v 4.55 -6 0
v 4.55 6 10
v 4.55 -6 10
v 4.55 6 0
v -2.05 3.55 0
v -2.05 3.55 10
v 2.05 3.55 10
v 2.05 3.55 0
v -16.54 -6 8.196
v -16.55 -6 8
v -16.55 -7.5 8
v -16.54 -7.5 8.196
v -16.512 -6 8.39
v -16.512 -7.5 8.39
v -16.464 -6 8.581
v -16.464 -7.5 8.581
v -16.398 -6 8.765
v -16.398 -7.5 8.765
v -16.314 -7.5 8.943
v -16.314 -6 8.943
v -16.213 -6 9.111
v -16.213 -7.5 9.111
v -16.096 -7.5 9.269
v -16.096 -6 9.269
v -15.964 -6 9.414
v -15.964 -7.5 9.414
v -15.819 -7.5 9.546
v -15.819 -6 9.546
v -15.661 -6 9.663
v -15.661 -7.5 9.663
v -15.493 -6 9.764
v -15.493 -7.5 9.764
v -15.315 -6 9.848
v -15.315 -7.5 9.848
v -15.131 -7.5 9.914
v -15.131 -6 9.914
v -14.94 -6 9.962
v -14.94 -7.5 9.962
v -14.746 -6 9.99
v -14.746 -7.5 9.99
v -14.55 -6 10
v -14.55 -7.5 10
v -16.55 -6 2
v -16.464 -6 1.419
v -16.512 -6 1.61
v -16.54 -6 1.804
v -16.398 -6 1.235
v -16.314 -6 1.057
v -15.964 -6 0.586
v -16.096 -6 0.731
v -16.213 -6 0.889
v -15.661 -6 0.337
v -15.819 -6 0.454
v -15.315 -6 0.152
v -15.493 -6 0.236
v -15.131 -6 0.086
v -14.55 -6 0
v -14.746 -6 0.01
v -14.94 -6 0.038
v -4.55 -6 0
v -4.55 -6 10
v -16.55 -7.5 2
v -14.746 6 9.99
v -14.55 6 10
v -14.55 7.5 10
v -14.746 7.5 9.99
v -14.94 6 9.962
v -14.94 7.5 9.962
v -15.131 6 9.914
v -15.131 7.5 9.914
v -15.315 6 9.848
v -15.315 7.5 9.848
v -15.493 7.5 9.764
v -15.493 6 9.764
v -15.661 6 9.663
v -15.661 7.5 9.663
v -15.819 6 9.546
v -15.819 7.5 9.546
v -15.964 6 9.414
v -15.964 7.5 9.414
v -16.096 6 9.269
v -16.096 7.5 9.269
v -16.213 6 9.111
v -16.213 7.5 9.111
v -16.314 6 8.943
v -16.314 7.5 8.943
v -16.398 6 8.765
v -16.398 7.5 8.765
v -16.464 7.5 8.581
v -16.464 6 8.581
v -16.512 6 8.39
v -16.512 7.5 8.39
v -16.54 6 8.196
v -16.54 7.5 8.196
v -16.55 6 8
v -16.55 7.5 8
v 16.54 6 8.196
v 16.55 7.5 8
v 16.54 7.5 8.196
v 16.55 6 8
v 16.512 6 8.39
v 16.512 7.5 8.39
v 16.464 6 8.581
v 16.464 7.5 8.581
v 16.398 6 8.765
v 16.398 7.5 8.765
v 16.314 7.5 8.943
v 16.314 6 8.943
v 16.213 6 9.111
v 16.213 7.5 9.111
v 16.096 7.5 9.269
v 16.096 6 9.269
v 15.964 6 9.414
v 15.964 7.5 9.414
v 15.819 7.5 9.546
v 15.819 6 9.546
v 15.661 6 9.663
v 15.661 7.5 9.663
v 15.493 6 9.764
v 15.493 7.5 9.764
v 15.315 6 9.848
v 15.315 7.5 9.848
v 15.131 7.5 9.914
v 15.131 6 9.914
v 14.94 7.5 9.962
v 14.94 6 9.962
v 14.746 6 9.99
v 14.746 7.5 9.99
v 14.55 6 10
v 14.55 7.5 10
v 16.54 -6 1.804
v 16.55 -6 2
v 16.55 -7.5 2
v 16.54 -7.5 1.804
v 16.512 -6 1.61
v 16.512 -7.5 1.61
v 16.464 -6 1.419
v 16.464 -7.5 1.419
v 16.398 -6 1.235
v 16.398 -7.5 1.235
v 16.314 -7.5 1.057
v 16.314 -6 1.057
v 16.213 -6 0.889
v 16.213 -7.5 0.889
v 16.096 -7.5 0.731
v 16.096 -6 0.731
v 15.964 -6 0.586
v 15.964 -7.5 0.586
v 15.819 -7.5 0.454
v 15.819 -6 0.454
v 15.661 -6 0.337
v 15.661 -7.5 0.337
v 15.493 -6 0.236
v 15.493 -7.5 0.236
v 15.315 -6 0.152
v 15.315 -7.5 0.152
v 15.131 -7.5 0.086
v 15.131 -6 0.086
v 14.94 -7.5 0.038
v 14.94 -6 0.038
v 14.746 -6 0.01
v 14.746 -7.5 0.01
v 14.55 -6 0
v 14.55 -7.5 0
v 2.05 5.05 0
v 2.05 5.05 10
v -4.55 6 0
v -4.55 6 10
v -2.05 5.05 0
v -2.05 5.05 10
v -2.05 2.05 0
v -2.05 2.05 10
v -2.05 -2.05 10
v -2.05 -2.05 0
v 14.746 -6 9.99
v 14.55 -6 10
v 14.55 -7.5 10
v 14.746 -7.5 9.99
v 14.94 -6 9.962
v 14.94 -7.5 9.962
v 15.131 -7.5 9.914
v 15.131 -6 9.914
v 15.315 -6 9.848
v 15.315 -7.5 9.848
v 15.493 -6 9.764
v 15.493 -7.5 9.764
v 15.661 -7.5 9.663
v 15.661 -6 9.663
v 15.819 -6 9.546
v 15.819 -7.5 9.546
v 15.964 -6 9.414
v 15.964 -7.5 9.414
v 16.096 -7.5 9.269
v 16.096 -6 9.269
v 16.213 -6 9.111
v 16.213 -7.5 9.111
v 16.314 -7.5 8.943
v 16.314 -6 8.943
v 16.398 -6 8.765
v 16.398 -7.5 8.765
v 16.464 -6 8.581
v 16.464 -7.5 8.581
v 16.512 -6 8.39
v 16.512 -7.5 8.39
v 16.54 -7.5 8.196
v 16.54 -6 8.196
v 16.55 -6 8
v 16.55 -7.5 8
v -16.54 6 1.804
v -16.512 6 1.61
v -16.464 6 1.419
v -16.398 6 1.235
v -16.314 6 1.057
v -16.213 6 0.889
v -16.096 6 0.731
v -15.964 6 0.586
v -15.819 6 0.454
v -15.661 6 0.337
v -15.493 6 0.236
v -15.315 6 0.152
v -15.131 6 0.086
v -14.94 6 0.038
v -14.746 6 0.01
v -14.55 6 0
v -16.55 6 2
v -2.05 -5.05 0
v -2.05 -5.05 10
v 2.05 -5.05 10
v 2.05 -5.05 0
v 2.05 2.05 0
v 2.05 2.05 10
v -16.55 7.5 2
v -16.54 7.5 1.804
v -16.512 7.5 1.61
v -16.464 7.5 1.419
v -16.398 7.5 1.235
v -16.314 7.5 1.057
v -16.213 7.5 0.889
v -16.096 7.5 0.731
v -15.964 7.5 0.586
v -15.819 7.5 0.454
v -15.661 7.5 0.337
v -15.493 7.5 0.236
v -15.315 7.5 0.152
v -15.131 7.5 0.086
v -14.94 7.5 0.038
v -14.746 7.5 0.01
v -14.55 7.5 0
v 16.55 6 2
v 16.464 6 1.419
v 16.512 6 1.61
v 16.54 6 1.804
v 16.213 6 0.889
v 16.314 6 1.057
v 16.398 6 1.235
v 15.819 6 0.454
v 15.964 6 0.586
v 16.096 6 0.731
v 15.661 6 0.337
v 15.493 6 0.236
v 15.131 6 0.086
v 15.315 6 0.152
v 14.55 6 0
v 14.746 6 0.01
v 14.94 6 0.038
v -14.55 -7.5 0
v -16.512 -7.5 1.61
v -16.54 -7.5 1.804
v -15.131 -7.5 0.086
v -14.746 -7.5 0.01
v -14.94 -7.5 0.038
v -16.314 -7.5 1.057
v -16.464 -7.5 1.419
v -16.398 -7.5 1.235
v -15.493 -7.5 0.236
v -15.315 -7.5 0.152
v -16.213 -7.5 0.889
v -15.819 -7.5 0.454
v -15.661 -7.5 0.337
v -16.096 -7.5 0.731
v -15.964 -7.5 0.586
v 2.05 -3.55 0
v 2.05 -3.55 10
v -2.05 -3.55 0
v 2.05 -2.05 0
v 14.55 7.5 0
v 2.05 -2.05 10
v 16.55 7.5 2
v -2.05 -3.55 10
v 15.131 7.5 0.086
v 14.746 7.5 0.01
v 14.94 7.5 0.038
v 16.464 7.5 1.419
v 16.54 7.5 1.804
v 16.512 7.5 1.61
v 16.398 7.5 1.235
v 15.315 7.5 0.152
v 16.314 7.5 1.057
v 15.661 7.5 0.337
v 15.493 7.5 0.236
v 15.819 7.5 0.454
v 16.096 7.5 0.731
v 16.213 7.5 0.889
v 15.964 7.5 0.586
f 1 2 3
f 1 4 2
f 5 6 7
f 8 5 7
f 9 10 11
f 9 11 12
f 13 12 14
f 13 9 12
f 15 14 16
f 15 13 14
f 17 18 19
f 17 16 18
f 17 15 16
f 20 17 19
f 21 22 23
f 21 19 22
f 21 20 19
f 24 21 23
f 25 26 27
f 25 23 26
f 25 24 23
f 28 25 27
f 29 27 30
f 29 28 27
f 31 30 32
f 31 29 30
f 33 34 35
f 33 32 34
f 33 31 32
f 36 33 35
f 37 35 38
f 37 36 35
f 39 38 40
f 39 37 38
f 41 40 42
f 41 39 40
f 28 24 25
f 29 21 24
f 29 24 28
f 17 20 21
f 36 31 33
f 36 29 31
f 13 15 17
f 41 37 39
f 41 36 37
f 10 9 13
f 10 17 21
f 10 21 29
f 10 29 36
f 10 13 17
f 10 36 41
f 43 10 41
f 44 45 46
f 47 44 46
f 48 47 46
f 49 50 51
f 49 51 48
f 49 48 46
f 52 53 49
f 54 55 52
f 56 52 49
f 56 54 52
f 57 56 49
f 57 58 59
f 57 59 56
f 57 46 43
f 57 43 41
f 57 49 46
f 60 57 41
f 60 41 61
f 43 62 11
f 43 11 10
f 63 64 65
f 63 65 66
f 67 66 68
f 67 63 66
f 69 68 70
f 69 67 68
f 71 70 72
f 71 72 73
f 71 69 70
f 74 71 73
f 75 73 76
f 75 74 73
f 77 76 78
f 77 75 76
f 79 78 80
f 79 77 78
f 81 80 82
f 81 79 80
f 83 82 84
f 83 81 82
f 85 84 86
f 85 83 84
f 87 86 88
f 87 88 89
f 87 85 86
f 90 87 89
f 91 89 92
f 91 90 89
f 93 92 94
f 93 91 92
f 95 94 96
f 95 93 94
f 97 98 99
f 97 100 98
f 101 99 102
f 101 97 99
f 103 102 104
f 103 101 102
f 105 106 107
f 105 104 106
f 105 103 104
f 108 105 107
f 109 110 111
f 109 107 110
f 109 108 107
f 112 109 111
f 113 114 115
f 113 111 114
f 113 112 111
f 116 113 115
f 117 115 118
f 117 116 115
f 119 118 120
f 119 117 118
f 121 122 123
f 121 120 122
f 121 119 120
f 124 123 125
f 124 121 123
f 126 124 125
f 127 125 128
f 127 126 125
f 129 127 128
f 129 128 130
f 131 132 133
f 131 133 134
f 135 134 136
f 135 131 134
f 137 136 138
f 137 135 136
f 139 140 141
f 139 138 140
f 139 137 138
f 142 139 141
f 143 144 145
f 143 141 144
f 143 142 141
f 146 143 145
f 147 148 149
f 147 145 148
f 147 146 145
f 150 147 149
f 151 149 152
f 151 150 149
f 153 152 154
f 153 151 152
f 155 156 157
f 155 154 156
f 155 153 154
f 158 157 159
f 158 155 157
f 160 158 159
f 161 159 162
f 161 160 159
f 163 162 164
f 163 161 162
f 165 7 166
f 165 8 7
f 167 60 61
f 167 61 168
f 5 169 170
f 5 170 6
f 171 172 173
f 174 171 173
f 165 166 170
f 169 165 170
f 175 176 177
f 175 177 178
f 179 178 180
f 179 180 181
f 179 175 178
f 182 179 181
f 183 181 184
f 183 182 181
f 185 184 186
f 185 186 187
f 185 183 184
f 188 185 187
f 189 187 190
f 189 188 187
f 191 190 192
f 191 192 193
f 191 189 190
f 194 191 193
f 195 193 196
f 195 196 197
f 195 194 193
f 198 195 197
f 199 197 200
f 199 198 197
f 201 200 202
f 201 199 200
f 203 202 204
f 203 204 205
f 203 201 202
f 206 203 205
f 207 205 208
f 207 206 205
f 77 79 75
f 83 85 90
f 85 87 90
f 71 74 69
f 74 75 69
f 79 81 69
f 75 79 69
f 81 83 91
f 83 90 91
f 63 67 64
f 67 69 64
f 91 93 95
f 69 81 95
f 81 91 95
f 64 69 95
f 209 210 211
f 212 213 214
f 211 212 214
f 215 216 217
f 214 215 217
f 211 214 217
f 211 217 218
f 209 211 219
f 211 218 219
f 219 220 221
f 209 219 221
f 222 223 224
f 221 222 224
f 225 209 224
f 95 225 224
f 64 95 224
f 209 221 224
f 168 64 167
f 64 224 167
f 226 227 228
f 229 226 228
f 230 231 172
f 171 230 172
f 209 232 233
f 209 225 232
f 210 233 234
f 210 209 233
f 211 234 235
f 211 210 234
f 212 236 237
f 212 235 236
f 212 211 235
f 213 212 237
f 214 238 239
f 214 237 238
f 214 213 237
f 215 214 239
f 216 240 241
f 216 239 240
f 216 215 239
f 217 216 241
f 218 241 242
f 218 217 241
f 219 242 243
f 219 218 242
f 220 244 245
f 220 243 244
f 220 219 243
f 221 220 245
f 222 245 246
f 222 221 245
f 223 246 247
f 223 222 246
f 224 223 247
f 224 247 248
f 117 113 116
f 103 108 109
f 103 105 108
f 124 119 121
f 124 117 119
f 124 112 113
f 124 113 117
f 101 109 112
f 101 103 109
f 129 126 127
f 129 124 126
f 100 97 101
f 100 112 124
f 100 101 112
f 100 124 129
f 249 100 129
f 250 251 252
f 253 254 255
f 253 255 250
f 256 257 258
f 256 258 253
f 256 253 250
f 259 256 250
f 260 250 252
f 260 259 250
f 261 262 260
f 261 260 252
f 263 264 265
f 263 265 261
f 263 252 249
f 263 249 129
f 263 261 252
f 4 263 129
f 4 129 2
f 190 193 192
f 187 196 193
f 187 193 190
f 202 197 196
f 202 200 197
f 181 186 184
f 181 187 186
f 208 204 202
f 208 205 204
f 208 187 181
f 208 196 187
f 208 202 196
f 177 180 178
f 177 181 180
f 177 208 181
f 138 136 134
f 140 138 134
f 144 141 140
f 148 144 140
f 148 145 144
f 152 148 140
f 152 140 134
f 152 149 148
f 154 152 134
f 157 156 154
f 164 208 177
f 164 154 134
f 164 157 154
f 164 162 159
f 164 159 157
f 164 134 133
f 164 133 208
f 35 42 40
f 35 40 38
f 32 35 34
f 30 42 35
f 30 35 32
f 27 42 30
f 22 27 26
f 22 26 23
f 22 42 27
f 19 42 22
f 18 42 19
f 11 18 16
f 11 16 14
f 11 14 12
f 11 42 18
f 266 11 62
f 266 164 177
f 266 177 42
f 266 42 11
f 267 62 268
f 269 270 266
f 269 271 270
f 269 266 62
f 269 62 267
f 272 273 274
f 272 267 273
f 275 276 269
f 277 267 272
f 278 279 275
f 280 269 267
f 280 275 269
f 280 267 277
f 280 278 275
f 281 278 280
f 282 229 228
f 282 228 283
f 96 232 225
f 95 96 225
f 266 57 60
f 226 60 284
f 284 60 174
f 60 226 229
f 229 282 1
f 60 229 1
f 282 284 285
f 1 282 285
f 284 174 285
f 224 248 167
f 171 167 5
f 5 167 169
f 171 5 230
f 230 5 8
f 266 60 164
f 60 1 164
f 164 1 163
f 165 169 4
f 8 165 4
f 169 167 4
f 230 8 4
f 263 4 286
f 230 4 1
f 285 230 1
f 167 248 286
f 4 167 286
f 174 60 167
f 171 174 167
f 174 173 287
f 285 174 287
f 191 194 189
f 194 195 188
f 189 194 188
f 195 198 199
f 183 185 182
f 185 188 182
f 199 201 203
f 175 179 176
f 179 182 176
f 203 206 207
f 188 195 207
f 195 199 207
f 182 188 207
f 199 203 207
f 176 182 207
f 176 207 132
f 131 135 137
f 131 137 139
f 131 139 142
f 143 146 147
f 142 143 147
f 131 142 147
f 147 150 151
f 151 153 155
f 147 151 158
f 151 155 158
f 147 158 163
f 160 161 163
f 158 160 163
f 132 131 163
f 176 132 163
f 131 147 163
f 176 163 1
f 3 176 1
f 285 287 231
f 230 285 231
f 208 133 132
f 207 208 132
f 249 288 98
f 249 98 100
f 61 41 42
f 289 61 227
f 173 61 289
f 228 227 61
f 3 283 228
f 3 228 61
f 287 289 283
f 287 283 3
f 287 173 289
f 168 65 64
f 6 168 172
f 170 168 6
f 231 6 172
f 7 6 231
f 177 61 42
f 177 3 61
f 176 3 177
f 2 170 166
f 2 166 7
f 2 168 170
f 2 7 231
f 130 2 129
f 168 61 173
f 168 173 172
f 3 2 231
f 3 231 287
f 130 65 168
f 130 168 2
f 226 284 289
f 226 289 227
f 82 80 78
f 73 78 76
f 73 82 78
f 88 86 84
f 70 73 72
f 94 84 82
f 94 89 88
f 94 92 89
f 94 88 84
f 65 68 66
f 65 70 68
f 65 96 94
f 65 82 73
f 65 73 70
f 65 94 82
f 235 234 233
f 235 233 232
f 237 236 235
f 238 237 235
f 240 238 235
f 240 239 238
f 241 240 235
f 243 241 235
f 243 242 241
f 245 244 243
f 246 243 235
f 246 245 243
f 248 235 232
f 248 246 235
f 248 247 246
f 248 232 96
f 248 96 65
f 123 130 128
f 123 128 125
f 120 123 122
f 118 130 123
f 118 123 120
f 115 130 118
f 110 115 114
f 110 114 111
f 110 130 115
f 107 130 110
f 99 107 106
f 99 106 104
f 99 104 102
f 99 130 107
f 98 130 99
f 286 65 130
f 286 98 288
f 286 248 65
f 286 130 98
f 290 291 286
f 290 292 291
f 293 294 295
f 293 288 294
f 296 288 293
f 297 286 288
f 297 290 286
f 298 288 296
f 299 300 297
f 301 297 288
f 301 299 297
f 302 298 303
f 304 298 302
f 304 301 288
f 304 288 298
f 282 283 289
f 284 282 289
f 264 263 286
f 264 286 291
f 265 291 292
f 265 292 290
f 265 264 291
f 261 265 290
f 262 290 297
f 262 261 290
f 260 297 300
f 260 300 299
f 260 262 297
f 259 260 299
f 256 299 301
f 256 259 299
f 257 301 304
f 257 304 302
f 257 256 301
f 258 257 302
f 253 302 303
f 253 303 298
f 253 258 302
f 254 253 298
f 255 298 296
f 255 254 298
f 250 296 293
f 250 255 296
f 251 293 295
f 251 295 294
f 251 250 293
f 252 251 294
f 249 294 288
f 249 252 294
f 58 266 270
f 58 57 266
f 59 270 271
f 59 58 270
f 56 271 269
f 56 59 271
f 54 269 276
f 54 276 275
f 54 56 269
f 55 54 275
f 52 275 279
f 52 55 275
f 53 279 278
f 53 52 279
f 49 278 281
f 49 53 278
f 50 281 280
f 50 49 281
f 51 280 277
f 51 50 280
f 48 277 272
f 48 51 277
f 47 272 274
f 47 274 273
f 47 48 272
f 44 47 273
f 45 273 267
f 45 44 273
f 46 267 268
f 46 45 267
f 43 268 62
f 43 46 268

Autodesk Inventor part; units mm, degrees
ref_plane "YZ Plane" through (0, 0, 0) normal (1, 0, 0) x (0, 1, 0)
ref_plane "XZ Plane" through (0, 0, 0) normal (0, 1, 0) x (-1, 0, 0)
ref_plane "XY Plane" through (0, 0, 0) normal (0, 0, 1) x (1, 0, 0)
sketch "Sketch1" plane through (0, 0, 0) normal (0, 0, 1) x (1, 0, 0)
  line L0 (-4.55, 7.5) -> (4.55, 7.5)
  line L1 (4.55, 7.5) -> (4.55, -7.5)
  line L2 (4.55, -7.5) -> (-4.55, -7.5)
  line L3 (-4.55, -7.5) -> (-4.55, 7.5)
  line L4 (-4.55, 7.5) -> (4.55, -7.5) construction
  line L5 (4.55, 7.5) -> (-4.55, -7.5) construction
  line L6 (-2.05, -2.05) -> (2.05, -2.05)
  line L7 (2.05, -2.05) -> (2.05, 2.05)
  line L8 (2.05, 2.05) -> (-2.05, 2.05)
  line L9 (-2.05, 2.05) -> (-2.05, -2.05)
  line L10 (-2.05, -2.05) -> (2.05, 2.05) construction
  line L11 (2.05, -2.05) -> (-2.05, 2.05) construction
  line L12 (-4.55, 7.5) -> (-16.55, 7.5)
  line L13 (-16.55, 7.5) -> (-16.55, 6)
  line L14 (-16.55, 6) -> (-4.55, 6)
  line L15 (-4.55, 6) -> (-4.55, 7.5)
  line L16 (-4.55, -7.5) -> (-16.55, -7.5)
  line L17 (-16.55, -7.5) -> (-16.55, -6)
  line L18 (-16.55, -6) -> (-4.55, -6)
  line L19 (-4.55, -6) -> (-4.55, -7.5)
  line L20 (4.55, 7.5) -> (16.55, 7.5)
  line L21 (16.55, 7.5) -> (16.55, 6)
  line L22 (16.55, 6) -> (4.55, 6)
  line L23 (4.55, 6) -> (4.55, 7.5)
  line L24 (4.55, -7.5) -> (16.55, -7.5)
  line L25 (16.55, -7.5) -> (16.55, -6)
  line L26 (16.55, -6) -> (4.55, -6)
  line L27 (4.55, -6) -> (4.55, -7.5)
  point P0 (0, 0)
  point P1 (-4.55, 6)
  point P2 (-4.55, -6)
  point P3 (4.55, 6)
  dimension "d0" = 15
  dimension "d1" = 9.1
  dimension "d2" = 4.1
  dimension "d3" = 4.1
  dimension "d4" = 12
  dimension "d5" = 1.5
  dimension "d8" = 1.5
  dimension "d9" = 12
  dimension "d10" = 12
  dimension "d11" = 1.5
  dimension "d12" = 12
extrude "Extrusion1" add sketch "Sketch1" along normal blind 10
sketch "Sketch2" plane through (0, 0, 10) normal (0, 0, 1) x (1, 0, 0)
  point P0 (0, 0)
fillet "Fillet1" radius 2 8 edges at (-16.55, 6.75, 10) (-16.55, -6.75, 10) (16.55, -6.75, 10) (16.55, 6.75, 10) (16.55, 6.75, 0) (-16.55, 6.75, 0) (-16.55, -6.75, 0) (16.55, -6.75, 0)
sketch "Sketch3" plane through (0, 0, 0) normal (0, 0, -1) x (-1, 0, 0)
  line L0 (-2.05, 5.05) -> (2.05, 5.05)
  line L1 (2.05, 5.05) -> (2.05, 3.55)
  line L2 (2.05, 3.55) -> (-2.05, 3.55)
  line L3 (-2.05, 3.55) -> (-2.05, 5.05)
  line L4 (-2.05, -3.55) -> (2.05, -3.55)
  line L5 (2.05, -3.55) -> (2.05, -5.05)
  line L6 (2.05, -5.05) -> (-2.05, -5.05)
  line L7 (-2.05, -5.05) -> (-2.05, -3.55)
  line L8 (-2.05, 2.05) -> (-2.05, -2.05) projected
  line L9 (2.05, -2.05) -> (2.05, 2.05) projected
  line L10 (2.05, 2.05) -> (-2.05, 2.05) projected
  line L11 (-2.05, -2.05) -> (2.05, -2.05) projected
  point P0 (0, 0)
  dimension "d16" = 1.5
  dimension "d17" = 1.5
  dimension "d18" = 1.5
  dimension "d19" = 1.5
extrude "Extrusion2" cut sketch "Sketch3" against normal blind 10 contours L0 L1 L2 L3 | L4 L5 L6 L7
properties part number "fuselage_tail_interface_back"
